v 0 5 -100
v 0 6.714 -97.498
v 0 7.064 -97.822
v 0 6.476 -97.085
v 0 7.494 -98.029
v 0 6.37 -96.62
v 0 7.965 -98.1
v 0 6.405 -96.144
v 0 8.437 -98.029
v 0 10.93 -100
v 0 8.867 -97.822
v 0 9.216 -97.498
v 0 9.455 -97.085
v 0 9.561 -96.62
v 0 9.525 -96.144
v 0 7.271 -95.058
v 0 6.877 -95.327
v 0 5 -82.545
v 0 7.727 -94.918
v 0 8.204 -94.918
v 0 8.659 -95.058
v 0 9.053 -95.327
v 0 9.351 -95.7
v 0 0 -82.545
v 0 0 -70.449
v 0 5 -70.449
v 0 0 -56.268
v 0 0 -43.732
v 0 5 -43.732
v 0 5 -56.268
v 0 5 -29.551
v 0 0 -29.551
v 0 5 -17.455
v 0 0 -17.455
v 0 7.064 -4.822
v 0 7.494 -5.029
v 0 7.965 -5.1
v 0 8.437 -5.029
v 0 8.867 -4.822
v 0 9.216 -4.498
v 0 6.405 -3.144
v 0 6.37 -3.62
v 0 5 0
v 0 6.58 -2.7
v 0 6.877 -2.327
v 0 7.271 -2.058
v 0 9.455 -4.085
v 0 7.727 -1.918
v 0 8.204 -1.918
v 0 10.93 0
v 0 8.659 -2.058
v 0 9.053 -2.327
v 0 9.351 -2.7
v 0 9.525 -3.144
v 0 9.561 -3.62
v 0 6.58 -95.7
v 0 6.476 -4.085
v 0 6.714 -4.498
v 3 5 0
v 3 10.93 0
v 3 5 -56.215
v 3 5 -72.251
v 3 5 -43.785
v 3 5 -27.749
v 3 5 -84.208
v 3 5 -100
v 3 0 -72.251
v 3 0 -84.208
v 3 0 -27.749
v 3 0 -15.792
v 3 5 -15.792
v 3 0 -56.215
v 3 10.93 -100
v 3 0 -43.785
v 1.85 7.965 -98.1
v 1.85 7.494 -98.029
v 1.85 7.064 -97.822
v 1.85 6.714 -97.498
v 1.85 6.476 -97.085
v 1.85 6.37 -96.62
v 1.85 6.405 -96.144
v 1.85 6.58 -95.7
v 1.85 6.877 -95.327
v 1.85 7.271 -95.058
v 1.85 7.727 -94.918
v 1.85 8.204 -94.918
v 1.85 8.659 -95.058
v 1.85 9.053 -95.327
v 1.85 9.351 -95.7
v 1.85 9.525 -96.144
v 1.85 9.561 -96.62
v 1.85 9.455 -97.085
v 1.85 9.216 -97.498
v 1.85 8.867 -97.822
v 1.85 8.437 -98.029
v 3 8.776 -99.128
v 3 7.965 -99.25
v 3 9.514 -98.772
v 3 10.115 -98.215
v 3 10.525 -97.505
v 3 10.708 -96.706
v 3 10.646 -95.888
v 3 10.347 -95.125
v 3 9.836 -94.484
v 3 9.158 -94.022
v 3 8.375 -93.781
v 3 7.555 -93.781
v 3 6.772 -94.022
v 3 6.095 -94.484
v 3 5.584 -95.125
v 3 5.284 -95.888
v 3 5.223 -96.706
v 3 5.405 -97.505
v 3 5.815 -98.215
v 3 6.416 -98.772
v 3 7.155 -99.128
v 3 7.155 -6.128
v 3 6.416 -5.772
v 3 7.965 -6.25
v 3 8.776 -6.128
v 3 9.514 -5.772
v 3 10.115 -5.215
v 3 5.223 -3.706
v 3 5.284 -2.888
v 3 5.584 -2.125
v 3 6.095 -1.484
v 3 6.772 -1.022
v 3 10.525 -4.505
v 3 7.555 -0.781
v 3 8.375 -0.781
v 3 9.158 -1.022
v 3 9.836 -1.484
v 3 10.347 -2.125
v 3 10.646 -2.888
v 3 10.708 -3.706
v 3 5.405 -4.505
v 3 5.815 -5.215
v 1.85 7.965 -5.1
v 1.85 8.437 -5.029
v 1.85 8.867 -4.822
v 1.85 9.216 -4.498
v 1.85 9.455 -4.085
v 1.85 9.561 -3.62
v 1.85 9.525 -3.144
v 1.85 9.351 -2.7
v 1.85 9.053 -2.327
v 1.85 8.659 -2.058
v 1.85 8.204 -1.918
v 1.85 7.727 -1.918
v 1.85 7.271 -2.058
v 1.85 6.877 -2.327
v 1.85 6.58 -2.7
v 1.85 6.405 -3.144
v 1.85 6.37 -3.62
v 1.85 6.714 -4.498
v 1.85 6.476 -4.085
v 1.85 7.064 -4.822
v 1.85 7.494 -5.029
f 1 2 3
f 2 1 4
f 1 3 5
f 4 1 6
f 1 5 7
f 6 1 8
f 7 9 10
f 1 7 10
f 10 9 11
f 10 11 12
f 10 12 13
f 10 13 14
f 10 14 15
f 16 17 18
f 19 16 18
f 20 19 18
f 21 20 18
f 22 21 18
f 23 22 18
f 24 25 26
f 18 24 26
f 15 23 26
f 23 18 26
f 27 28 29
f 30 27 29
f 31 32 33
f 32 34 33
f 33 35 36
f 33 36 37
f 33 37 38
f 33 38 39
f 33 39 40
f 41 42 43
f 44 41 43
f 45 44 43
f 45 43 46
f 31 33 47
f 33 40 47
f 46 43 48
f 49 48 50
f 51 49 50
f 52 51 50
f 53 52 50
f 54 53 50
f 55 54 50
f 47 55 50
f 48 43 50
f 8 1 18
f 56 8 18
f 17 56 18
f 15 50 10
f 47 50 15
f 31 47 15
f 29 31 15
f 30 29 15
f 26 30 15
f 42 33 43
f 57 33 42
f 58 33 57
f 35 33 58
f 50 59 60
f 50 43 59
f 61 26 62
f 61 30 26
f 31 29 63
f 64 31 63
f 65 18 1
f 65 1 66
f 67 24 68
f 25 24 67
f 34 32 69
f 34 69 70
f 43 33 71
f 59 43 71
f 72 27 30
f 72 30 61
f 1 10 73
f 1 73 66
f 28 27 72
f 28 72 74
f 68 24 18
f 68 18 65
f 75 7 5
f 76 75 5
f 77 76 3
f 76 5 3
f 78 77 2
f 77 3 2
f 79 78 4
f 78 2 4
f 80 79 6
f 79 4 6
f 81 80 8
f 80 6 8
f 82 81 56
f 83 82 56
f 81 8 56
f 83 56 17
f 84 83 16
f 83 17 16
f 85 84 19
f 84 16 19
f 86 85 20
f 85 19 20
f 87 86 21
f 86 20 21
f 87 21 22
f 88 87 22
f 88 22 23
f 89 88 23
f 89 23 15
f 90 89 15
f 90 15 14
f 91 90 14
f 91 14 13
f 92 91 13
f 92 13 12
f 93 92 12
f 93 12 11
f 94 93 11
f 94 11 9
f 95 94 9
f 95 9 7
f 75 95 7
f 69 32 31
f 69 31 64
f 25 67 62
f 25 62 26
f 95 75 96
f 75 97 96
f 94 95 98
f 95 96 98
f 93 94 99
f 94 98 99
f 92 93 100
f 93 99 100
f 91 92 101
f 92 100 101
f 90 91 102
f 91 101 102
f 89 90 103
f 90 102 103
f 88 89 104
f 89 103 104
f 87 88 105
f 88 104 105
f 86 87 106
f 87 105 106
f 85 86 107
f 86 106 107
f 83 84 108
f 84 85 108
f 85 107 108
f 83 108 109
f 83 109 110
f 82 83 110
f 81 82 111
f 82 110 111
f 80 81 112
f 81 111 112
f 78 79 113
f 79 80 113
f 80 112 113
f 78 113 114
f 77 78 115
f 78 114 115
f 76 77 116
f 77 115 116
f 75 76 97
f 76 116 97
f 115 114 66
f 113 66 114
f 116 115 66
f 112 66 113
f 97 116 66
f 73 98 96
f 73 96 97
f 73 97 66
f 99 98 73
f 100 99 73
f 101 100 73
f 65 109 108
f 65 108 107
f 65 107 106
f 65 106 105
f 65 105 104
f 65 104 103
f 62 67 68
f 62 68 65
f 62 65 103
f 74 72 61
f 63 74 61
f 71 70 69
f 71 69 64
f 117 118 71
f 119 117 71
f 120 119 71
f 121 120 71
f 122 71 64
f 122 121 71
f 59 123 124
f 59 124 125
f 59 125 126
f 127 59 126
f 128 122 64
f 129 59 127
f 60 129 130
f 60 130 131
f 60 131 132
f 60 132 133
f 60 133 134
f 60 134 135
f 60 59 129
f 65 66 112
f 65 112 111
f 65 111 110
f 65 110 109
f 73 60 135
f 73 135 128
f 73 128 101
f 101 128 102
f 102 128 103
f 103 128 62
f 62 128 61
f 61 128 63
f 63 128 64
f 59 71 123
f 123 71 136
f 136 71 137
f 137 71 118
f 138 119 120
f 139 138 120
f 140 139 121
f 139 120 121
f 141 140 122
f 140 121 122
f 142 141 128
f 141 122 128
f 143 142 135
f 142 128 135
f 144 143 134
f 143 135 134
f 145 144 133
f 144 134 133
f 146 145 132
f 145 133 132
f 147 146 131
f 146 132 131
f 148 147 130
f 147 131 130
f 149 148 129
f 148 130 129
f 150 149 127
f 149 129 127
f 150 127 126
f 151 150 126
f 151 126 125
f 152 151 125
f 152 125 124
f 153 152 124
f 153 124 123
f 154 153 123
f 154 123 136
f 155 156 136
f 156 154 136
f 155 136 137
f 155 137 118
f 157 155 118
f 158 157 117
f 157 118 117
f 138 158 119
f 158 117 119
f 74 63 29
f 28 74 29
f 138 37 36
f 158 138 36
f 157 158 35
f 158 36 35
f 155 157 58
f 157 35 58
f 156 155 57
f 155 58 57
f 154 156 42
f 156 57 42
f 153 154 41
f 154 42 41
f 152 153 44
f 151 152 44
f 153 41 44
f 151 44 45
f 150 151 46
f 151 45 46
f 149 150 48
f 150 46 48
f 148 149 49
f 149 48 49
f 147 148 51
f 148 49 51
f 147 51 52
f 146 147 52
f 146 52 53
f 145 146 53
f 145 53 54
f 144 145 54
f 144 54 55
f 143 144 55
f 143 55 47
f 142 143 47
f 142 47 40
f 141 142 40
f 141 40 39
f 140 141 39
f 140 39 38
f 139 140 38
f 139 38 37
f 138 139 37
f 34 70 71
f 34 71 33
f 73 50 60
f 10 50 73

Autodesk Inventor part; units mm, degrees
ref_plane "YZ Plane" through (0, 0, 0) normal (1, 0, 0) x (0, 1, 0)
ref_plane "XZ Plane" through (0, 0, 0) normal (0, 1, 0) x (-1, 0, 0)
ref_plane "XY Plane" through (0, 0, 0) normal (0, 0, 1) x (1, 0, 0)
sketch "Szkic1" plane through (0, 0, 0) normal (1, 0, 0) x (0, 1, 0)
  line L0 (0, 0) -> (10.93, 0)
  line L1 (10.93, 0) -> (10.93, -100)
  line L2 (10.93, -100) -> (0, -100)
  line L3 (0, -100) -> (0, 0)
  dimension "d0" = 10.93
  dimension "d1" = 100
extrude "Wyciągnięcie proste1" add sketch "Szkic1" along normal blind 3
sketch "Szkic2" plane through (0, 0, -100) normal (0, -1, 0) x (1, 0, 0)
  line L0 (-5, 84) -> (-8.1113, 87.1113) projected
  line L1 (-5, 84) -> (-4.2222, 84.7778) projected
  line L2 (-8.1113, 87.1113) -> (-7.3335, 87.8891) projected
  line L3 (-2, 60) -> (-3.1388, 64.2501) projected
  line L4 (-2, 60) -> (-0.9375, 60.2847) projected
  line L5 (-3.1388, 64.2501) -> (-2.0763, 64.5348) projected
  line L6 (-3.1388, 35.7499) -> (-2, 40) projected
  line L7 (-3.1388, 35.7499) -> (-2.0763, 35.4652) projected
  line L8 (-2, 40) -> (-0.9375, 39.7153) projected
  line L9 (-8.1113, 12.8887) -> (-5, 16) projected
  line L10 (-8.1113, 12.8887) -> (-7.3335, 12.1109) projected
  line L11 (-5, 16) -> (-4.2222, 15.2222) projected
  line L12 (-30.0489, 4.1) -> (-25.6489, 4.1) projected
  line L13 (-30.0489, 4.1) -> (-30.0489, 3) projected
  line L14 (-25.6489, 4.1) -> (-25.6489, 3) projected
  line L15 (-1.7913, 81.5519) -> (-5, 78.3431)
  line L16 (-5, 78.3431) -> (-13.7681, 87.1113)
  line L17 (-13.7681, 87.1113) -> (-10.5594, 90.32)
  line L18 (-10.5594, 90.32) -> (185.0217, 443.1577)
  arc A0 (351.0464, 277.133) -> (185.0217, 443.1577) centre (-11.203, 80.9083) ccw
  line L19 (351.0464, 277.133) -> (-1.7913, 81.5519)
  arc A1 (402.9118, 49.2349) -> (342.1425, 276.0288) centre (-8.9178, 60.424) ccw
  line L20 (402.9118, 49.2349) -> (-0.4452, 56.2755)
  line L21 (-0.4452, 56.2755) -> (-4.8284, 55.101)
  line L22 (-4.8284, 55.101) -> (-8.0378, 67.0785)
  line L23 (-8.0378, 67.0785) -> (-3.6546, 68.253)
  line L24 (-3.6546, 68.253) -> (342.1425, 276.0288)
  arc A2 (342.1425, -176.0288) -> (402.9118, 50.7651) centre (-8.9178, 39.576) ccw
  line L25 (342.1425, -176.0288) -> (-3.6546, 31.747)
  line L26 (-3.6546, 31.747) -> (-8.0378, 32.9215)
  line L27 (-8.0378, 32.9215) -> (-4.8284, 44.899)
  line L28 (-4.8284, 44.899) -> (-0.4452, 43.7245)
  line L29 (-0.4452, 43.7245) -> (402.9118, 50.7651)
  arc A3 (185.0217, -343.1577) -> (351.0464, -177.133) centre (-11.203, 19.0917) ccw
  line L30 (185.0217, -343.1577) -> (-10.5594, 9.68)
  line L31 (-10.5594, 9.68) -> (-13.7681, 12.8887)
  line L32 (-13.7681, 12.8887) -> (-5, 21.6569)
  line L33 (-5, 21.6569) -> (-1.7913, 18.4481)
  line L34 (-1.7913, 18.4481) -> (351.0464, -177.133)
  line L35 (-25.6489, 3) -> (-30.0489, 3) projected
  line L36 (-0.9375, 39.7153) -> (-2.0763, 35.4652) projected
  line L37 (-7.3335, 87.8891) -> (-4.2222, 84.7778) projected
  line L38 (-2.0763, 64.5348) -> (-0.9375, 60.2847) projected
  line L39 (-4.2222, 15.2222) -> (-7.3335, 12.1109) projected
  point P0 (0, 100)
  point P1 (259.8393, 226.5761)
  point P2 (359.0779, 50)
  point P3 (259.8393, -126.5761)
  point P4 (343.886, -173.1639)
  point P5 (402.9318, 50)
  point P6 (343.886, 273.1639)
extrude "Wyciągnięcie proste2" cut sketch "Szkic2" against normal blind 5 contours L0 L2 L37 L1 | L3 L5 L38 L4 | L6 L8 L36 L7 | L9 L11 L39 L10 | L15 L16 L17 L18 A0 L19 A1 L24 | L24 A1 L19 | L19 A1 A2 L29 L20 L21 L22 L23 L24 | A2 L34 L25 L26 L27 L28 L29 L20 A1 | A1 L20 L29 A2 | L34 A3 L30 L31 L32 L33 L25 A2 | A2 L25 L34
sketch "Szkic3" plane through (3, 0, 0) normal (1, 0, 0) x (0, 0, -1)
  circle A0 centre (3.5, 7.9652) radius 2 projected
  circle A1 centre (96.5, 7.9652) radius 2 projected
  point P0 (0, 0)
hole "Otwór1" at (3, 7.9652, -3.5) at (3, 7.9652, -96.5) direction (-1, 0, 0) diameter 3.2 depth 5 tip angle 118 countersink diameter 5.5 countersink angle 90
properties part number "przod_kopia" material "Stal, odlew"
